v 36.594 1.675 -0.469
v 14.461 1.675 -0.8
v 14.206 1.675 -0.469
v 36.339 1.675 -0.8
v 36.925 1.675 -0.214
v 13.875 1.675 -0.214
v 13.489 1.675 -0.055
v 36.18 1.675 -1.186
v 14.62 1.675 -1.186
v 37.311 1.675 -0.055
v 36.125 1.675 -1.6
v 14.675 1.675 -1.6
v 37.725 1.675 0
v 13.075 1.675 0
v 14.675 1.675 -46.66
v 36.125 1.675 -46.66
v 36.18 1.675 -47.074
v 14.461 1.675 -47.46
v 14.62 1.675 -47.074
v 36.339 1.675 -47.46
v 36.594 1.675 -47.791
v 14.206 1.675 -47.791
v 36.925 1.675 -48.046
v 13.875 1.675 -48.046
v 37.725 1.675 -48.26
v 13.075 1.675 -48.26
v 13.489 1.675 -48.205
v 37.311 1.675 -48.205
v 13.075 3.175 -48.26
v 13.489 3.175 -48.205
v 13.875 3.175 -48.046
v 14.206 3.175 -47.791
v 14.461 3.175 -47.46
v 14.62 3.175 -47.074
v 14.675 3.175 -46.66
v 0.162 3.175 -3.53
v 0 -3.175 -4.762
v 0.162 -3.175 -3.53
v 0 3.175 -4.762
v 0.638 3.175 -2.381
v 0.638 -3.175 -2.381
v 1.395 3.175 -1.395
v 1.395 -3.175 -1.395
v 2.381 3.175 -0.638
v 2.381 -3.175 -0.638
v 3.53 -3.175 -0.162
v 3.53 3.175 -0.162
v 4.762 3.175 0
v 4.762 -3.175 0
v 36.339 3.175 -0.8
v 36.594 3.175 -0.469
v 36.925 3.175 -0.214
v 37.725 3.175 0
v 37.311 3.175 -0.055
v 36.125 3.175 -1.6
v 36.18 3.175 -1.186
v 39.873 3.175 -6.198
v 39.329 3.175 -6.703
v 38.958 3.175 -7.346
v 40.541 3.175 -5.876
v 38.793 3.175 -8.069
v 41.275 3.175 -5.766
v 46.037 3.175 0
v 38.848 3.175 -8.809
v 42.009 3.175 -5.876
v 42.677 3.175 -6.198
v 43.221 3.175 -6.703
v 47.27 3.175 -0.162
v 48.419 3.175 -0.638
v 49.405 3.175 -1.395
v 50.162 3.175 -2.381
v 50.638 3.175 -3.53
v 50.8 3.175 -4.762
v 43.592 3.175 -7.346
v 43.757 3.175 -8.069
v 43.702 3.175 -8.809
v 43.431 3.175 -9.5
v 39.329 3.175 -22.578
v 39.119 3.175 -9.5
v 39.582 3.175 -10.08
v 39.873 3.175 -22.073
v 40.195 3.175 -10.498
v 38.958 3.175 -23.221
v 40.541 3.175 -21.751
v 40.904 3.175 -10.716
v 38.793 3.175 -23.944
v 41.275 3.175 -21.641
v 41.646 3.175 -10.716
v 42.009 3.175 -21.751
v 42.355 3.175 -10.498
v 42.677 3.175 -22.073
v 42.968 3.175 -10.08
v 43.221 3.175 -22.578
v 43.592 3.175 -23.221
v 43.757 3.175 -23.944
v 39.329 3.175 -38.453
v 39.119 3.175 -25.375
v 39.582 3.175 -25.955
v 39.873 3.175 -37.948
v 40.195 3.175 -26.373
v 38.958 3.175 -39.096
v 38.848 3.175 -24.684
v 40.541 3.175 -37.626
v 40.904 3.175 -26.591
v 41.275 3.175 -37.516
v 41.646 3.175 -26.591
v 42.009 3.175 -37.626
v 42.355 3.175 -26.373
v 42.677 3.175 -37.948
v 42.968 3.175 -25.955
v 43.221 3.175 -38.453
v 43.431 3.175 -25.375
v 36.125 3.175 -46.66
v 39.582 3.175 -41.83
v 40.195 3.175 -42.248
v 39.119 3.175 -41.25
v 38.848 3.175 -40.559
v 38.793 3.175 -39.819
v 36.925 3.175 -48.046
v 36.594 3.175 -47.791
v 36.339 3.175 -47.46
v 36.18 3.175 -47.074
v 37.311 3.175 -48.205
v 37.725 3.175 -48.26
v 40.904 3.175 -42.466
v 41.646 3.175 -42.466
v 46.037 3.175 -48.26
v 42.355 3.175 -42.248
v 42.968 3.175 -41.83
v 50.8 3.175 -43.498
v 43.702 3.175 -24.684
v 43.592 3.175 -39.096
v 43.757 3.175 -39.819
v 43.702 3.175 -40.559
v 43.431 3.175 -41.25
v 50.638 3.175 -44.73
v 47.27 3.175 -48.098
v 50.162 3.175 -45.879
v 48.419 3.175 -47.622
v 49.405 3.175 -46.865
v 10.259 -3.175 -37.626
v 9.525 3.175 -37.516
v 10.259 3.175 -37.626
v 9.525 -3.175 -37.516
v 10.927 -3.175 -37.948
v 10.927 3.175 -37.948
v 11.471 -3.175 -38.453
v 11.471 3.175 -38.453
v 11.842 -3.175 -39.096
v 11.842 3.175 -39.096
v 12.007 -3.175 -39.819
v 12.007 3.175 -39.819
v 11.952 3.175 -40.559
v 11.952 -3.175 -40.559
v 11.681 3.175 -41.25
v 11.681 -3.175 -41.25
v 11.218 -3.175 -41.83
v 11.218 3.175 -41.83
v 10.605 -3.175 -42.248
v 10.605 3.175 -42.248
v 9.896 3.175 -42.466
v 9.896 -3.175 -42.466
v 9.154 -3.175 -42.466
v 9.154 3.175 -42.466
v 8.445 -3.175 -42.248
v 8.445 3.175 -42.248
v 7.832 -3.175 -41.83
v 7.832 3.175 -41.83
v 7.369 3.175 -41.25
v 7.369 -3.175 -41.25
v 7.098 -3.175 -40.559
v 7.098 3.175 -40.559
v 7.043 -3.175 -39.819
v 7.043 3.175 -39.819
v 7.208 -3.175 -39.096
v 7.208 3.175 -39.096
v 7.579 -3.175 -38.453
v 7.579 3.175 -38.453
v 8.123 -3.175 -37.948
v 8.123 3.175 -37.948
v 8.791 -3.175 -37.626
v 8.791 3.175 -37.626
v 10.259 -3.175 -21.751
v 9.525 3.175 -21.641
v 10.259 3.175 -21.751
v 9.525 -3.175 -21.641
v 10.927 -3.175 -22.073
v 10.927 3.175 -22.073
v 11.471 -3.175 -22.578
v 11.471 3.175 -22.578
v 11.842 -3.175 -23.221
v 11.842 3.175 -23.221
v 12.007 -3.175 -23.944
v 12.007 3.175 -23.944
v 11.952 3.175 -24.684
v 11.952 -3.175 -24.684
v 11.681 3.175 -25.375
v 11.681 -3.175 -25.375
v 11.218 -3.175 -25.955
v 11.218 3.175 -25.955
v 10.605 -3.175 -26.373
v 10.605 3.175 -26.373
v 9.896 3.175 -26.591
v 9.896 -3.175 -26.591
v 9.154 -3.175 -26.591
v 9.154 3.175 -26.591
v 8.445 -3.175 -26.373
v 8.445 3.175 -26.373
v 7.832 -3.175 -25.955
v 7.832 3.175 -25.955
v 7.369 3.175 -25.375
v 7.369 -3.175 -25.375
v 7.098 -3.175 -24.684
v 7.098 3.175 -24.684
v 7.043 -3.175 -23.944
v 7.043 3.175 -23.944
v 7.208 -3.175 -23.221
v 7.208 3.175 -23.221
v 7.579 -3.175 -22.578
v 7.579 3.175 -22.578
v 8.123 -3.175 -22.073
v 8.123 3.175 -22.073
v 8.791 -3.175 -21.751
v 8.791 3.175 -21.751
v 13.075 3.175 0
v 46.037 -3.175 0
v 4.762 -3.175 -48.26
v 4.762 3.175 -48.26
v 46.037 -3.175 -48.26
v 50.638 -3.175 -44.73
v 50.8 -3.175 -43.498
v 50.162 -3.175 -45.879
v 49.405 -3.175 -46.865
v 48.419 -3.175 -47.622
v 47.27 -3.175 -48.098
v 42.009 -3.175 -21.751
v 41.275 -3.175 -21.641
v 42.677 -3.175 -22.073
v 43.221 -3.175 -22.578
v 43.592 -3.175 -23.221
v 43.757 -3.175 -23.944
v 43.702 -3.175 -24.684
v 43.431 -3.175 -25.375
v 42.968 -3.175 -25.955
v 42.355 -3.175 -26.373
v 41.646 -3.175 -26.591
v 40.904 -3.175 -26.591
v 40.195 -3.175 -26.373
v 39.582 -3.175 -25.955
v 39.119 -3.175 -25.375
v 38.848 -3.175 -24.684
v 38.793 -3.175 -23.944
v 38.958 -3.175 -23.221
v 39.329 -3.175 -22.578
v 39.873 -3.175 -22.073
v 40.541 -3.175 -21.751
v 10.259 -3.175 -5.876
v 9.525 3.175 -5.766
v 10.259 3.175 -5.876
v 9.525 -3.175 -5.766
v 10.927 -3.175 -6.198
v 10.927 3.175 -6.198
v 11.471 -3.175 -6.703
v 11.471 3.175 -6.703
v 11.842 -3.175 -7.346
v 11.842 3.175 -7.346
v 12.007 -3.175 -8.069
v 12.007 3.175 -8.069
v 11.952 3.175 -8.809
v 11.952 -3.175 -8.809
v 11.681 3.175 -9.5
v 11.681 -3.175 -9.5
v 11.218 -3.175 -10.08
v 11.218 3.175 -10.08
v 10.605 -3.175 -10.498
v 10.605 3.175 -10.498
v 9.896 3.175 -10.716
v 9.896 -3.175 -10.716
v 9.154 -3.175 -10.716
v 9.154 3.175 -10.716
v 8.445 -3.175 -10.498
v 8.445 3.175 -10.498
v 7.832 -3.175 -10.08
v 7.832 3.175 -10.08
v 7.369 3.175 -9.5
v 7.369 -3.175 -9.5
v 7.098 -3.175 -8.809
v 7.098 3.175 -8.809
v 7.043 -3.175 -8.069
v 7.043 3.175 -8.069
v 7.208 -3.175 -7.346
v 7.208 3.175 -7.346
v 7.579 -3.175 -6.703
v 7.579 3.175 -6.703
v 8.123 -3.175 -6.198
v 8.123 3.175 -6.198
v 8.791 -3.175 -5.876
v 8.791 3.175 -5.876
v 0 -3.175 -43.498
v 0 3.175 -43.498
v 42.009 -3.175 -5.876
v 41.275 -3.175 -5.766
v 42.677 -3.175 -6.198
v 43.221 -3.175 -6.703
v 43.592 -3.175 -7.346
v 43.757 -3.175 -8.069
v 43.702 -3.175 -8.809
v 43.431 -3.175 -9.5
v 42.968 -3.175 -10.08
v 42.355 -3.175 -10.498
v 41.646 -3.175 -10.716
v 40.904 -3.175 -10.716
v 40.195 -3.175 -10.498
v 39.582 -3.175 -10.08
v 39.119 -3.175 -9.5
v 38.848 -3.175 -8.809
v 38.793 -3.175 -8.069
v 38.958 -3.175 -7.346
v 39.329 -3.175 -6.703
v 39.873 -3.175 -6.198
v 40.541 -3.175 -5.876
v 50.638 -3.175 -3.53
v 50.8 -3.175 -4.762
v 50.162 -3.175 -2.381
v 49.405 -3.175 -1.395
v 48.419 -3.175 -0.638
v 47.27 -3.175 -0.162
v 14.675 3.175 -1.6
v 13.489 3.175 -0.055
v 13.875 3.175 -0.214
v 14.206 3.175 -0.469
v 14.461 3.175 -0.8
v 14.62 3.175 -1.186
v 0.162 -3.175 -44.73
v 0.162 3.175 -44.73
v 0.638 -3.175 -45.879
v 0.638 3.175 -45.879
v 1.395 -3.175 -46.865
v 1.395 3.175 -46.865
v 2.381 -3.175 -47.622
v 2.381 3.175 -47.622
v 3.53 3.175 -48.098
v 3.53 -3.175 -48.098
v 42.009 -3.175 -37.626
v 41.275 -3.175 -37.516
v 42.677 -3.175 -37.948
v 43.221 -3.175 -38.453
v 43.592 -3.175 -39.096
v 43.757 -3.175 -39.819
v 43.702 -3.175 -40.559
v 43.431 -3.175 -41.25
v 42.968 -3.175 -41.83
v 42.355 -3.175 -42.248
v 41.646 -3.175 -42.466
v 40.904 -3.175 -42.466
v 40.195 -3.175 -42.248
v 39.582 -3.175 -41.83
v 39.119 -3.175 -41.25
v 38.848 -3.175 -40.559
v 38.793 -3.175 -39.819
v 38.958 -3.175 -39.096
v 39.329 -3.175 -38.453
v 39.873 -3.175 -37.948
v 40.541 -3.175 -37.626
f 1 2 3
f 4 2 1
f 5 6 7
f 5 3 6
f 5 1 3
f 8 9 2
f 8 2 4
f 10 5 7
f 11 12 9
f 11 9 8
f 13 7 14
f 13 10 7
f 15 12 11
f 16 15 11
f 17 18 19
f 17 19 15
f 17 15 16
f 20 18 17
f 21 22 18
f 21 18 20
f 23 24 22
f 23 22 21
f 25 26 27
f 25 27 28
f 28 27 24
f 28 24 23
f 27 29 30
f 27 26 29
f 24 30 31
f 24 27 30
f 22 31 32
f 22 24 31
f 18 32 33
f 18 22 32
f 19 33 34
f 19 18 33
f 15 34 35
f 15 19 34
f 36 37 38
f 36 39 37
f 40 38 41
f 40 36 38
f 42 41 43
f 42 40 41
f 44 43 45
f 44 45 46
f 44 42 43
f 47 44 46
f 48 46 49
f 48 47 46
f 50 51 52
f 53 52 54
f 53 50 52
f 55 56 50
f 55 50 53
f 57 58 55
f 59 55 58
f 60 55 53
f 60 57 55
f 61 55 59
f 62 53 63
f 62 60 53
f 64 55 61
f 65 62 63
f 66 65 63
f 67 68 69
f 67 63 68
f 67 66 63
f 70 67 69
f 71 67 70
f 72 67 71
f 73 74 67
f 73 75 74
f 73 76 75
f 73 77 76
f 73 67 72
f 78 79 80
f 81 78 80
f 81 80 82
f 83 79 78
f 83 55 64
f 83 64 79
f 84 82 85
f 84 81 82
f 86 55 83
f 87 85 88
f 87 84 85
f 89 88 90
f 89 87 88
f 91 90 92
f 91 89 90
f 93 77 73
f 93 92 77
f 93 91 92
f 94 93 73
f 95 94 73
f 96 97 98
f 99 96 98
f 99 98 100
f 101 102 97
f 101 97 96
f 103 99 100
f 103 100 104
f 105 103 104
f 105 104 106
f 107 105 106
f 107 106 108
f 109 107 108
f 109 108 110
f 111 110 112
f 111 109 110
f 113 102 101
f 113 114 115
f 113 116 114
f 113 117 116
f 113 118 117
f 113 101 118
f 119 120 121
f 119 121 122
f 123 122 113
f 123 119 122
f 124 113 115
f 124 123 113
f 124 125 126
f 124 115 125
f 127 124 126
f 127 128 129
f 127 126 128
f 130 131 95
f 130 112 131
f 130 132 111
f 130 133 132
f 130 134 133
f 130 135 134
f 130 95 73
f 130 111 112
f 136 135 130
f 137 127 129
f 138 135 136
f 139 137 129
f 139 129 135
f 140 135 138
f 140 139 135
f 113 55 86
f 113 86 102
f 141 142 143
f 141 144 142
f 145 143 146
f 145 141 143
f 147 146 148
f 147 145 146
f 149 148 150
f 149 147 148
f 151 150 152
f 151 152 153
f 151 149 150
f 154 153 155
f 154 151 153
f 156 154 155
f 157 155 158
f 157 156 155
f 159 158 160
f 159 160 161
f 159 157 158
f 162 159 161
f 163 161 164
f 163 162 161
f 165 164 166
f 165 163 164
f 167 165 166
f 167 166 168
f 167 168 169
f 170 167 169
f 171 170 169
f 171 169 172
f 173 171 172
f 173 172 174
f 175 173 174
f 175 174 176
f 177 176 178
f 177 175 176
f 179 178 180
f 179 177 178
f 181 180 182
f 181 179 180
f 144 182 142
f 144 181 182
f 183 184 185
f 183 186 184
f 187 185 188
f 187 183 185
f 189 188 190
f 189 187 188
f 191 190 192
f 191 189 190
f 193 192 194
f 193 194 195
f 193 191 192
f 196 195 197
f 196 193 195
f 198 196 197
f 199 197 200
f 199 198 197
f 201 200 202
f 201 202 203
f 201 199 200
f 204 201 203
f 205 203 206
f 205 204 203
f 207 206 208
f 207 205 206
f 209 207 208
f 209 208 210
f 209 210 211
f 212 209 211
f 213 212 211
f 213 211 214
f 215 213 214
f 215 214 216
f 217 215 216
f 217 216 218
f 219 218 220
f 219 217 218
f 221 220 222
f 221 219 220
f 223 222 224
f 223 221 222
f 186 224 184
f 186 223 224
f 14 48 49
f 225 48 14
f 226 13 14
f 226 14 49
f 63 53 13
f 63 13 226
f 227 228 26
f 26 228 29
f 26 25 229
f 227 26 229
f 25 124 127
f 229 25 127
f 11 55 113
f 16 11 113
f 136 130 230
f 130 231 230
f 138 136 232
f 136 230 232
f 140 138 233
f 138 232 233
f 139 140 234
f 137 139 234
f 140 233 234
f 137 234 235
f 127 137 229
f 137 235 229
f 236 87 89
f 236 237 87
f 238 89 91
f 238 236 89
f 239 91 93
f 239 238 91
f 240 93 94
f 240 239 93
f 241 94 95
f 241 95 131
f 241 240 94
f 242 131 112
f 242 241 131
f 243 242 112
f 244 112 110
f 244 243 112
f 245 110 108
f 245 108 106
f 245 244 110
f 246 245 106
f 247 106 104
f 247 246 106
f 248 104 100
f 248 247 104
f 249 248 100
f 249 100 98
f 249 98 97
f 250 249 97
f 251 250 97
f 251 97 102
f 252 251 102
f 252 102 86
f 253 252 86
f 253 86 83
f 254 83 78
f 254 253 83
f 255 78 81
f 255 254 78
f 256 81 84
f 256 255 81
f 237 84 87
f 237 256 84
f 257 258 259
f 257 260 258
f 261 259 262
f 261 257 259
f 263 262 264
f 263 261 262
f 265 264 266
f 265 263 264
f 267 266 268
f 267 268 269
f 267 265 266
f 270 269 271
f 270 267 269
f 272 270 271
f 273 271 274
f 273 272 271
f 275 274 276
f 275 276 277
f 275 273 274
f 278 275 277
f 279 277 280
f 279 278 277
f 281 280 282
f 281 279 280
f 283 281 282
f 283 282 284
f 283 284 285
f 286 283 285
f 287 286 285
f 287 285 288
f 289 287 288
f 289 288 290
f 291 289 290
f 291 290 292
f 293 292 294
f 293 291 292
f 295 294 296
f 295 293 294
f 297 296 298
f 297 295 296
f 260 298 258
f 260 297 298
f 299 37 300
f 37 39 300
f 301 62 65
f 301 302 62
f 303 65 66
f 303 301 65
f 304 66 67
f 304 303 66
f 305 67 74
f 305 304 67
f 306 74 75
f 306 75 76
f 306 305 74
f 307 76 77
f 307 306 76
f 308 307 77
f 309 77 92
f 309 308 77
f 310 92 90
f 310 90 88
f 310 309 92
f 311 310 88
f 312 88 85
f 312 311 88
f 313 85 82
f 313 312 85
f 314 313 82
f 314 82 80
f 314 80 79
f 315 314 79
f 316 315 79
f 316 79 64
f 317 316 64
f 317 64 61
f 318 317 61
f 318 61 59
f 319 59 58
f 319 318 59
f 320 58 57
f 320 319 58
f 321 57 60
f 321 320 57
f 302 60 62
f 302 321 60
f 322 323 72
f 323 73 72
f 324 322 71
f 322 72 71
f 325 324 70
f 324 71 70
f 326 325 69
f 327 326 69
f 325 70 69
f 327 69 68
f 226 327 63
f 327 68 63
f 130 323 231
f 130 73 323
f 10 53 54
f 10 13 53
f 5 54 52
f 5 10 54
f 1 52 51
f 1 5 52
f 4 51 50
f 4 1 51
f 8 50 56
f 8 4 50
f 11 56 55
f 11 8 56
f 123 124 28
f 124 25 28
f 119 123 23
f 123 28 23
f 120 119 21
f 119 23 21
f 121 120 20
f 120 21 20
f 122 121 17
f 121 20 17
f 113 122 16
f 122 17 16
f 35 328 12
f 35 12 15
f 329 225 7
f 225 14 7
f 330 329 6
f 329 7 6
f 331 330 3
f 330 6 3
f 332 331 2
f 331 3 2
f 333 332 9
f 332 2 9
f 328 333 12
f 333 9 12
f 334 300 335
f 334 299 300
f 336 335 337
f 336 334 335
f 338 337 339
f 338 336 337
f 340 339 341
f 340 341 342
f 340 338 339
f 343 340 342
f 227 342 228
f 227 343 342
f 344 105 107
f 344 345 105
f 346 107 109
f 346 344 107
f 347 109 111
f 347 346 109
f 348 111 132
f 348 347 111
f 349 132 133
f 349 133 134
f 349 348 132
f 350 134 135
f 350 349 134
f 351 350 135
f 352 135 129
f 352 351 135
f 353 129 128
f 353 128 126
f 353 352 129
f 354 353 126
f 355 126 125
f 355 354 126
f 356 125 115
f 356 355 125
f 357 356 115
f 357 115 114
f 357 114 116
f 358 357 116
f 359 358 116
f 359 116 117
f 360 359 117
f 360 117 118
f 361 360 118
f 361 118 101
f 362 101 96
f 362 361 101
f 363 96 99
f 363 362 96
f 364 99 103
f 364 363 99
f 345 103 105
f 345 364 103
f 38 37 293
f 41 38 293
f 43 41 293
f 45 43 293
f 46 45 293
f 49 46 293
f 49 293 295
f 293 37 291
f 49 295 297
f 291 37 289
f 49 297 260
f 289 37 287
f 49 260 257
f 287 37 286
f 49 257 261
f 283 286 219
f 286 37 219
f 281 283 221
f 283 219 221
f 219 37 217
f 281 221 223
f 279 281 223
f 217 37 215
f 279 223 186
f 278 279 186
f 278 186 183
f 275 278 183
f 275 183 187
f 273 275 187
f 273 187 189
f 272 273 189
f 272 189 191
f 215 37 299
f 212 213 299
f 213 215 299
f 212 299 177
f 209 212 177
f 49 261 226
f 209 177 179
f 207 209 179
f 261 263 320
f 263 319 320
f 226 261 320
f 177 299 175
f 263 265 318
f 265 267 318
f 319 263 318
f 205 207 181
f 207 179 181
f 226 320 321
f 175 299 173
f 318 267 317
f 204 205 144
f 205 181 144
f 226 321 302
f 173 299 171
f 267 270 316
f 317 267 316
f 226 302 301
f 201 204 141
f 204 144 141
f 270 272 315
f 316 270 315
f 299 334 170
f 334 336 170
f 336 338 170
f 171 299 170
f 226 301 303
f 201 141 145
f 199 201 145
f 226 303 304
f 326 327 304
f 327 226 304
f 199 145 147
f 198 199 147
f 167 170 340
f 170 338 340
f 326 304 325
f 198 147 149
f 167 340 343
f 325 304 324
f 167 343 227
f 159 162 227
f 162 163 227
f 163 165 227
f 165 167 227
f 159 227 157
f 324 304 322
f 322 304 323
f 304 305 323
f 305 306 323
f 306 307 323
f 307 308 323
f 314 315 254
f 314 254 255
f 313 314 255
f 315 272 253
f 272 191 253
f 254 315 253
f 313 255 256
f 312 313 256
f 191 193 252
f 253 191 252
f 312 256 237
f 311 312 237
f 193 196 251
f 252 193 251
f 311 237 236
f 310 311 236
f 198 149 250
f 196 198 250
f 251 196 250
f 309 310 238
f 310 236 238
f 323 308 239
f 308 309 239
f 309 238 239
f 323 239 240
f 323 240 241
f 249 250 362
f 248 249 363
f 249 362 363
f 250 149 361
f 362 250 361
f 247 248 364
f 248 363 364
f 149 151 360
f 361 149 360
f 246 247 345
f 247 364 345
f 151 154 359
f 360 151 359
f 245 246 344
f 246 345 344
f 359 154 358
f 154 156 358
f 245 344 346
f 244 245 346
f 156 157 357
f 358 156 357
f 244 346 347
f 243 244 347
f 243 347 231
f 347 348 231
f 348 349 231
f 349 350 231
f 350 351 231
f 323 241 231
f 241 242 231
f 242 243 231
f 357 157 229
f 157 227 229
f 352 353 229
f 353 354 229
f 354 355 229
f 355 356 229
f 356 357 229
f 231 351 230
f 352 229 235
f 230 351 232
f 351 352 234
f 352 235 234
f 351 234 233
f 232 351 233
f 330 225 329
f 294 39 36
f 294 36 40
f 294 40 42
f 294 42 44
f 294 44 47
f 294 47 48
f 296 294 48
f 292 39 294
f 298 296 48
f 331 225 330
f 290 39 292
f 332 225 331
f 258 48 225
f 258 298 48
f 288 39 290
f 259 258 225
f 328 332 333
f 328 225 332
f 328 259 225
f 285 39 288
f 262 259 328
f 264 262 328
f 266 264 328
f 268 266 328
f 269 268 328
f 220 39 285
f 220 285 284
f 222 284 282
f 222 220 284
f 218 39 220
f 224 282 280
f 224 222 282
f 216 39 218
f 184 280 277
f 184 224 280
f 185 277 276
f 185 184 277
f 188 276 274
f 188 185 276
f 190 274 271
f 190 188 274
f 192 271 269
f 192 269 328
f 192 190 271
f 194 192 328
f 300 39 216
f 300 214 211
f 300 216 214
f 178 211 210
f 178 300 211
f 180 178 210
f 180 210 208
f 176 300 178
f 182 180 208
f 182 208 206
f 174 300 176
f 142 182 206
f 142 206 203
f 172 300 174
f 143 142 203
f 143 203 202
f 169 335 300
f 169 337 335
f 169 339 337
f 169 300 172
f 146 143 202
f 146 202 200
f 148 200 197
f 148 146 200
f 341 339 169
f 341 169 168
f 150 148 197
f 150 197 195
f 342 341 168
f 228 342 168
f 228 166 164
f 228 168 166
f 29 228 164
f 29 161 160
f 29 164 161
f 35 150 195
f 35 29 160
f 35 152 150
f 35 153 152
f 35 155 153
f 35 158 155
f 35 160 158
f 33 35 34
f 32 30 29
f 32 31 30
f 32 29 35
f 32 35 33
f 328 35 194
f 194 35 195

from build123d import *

# Parameters (mm, degrees)
SKETCH1_W           = 50.8
SKETCH1_H           = 48.26
SKETCH1_R           = 2.4892
BOSS_EXTRUDE1_DEPTH = 3.175
FILLET1_R           = 4.7625
SKETCH3_W           = 21.450000026
SKETCH3_H           = 48.26
CUT_EXTRUDE2_DEPTH  = 1.499999794
FILLET2_R           = 1.600000102


with BuildPart() as part:
    # Sketch1 → Boss-Extrude1 (new, symmetric)
    with BuildSketch(Plane(origin=(0, 0, 0), x_dir=(1, 0, 0), z_dir=(0, 1, 0))):
        with Locations((25.4, 24.13)):
            Rectangle(SKETCH1_W, SKETCH1_H)
        with Locations(Location((9.525, 8.255, 0), (0, 0, 270))):
            Circle(SKETCH1_R, mode=Mode.SUBTRACT)
        with Locations(Location((9.525, 24.13, 0), (0, 0, 270))):
            Circle(SKETCH1_R, mode=Mode.SUBTRACT)
        with Locations(Location((9.525, 40.005, 0), (0, 0, 270))):
            Circle(SKETCH1_R, mode=Mode.SUBTRACT)
        with Locations(Location((41.275, 24.13, 0), (0, 0, 270))):
            Circle(SKETCH1_R, mode=Mode.SUBTRACT)
        with Locations(Location((41.275, 40.005, 0), (0, 0, 270))):
            Circle(SKETCH1_R, mode=Mode.SUBTRACT)
        with Locations(Location((41.275, 8.255, 0), (0, 0, 270))):
            Circle(SKETCH1_R, mode=Mode.SUBTRACT)
    extrude(amount=BOSS_EXTRUDE1_DEPTH, both=True)

    # Fillet1
    fillet1_edges = [part.edges().sort_by_distance(p)[0] for p in [
        (0, 0, 0),
        (0, 0, -48.26),
        (50.8, 0, -48.26),
        (50.8, 0, 0),
    ]]
    fillet(fillet1_edges, radius=FILLET1_R)

    # Sketch3 → Cut-Extrude2 (cut)
    with BuildSketch(Plane(origin=(0, 3.175, 0), x_dir=(1, 0, 0), z_dir=(0, 1, 0))):
        with Locations((25.4, 24.13)):
            Rectangle(SKETCH3_W, SKETCH3_H)
    extrude(amount=-CUT_EXTRUDE2_DEPTH, mode=Mode.SUBTRACT)

    # Fillet2
    fillet2_edges = [part.edges().sort_by_distance(p)[0] for p in [
        (14.674999987, 2.425000103, 0),
        (14.674999987, 2.425000103, -48.26),
        (36.125000013, 2.425000103, -48.26),
        (36.125000013, 2.425000103, 0),
    ]]
    fillet(fillet2_edges, radius=FILLET2_R)


solid = part.part
